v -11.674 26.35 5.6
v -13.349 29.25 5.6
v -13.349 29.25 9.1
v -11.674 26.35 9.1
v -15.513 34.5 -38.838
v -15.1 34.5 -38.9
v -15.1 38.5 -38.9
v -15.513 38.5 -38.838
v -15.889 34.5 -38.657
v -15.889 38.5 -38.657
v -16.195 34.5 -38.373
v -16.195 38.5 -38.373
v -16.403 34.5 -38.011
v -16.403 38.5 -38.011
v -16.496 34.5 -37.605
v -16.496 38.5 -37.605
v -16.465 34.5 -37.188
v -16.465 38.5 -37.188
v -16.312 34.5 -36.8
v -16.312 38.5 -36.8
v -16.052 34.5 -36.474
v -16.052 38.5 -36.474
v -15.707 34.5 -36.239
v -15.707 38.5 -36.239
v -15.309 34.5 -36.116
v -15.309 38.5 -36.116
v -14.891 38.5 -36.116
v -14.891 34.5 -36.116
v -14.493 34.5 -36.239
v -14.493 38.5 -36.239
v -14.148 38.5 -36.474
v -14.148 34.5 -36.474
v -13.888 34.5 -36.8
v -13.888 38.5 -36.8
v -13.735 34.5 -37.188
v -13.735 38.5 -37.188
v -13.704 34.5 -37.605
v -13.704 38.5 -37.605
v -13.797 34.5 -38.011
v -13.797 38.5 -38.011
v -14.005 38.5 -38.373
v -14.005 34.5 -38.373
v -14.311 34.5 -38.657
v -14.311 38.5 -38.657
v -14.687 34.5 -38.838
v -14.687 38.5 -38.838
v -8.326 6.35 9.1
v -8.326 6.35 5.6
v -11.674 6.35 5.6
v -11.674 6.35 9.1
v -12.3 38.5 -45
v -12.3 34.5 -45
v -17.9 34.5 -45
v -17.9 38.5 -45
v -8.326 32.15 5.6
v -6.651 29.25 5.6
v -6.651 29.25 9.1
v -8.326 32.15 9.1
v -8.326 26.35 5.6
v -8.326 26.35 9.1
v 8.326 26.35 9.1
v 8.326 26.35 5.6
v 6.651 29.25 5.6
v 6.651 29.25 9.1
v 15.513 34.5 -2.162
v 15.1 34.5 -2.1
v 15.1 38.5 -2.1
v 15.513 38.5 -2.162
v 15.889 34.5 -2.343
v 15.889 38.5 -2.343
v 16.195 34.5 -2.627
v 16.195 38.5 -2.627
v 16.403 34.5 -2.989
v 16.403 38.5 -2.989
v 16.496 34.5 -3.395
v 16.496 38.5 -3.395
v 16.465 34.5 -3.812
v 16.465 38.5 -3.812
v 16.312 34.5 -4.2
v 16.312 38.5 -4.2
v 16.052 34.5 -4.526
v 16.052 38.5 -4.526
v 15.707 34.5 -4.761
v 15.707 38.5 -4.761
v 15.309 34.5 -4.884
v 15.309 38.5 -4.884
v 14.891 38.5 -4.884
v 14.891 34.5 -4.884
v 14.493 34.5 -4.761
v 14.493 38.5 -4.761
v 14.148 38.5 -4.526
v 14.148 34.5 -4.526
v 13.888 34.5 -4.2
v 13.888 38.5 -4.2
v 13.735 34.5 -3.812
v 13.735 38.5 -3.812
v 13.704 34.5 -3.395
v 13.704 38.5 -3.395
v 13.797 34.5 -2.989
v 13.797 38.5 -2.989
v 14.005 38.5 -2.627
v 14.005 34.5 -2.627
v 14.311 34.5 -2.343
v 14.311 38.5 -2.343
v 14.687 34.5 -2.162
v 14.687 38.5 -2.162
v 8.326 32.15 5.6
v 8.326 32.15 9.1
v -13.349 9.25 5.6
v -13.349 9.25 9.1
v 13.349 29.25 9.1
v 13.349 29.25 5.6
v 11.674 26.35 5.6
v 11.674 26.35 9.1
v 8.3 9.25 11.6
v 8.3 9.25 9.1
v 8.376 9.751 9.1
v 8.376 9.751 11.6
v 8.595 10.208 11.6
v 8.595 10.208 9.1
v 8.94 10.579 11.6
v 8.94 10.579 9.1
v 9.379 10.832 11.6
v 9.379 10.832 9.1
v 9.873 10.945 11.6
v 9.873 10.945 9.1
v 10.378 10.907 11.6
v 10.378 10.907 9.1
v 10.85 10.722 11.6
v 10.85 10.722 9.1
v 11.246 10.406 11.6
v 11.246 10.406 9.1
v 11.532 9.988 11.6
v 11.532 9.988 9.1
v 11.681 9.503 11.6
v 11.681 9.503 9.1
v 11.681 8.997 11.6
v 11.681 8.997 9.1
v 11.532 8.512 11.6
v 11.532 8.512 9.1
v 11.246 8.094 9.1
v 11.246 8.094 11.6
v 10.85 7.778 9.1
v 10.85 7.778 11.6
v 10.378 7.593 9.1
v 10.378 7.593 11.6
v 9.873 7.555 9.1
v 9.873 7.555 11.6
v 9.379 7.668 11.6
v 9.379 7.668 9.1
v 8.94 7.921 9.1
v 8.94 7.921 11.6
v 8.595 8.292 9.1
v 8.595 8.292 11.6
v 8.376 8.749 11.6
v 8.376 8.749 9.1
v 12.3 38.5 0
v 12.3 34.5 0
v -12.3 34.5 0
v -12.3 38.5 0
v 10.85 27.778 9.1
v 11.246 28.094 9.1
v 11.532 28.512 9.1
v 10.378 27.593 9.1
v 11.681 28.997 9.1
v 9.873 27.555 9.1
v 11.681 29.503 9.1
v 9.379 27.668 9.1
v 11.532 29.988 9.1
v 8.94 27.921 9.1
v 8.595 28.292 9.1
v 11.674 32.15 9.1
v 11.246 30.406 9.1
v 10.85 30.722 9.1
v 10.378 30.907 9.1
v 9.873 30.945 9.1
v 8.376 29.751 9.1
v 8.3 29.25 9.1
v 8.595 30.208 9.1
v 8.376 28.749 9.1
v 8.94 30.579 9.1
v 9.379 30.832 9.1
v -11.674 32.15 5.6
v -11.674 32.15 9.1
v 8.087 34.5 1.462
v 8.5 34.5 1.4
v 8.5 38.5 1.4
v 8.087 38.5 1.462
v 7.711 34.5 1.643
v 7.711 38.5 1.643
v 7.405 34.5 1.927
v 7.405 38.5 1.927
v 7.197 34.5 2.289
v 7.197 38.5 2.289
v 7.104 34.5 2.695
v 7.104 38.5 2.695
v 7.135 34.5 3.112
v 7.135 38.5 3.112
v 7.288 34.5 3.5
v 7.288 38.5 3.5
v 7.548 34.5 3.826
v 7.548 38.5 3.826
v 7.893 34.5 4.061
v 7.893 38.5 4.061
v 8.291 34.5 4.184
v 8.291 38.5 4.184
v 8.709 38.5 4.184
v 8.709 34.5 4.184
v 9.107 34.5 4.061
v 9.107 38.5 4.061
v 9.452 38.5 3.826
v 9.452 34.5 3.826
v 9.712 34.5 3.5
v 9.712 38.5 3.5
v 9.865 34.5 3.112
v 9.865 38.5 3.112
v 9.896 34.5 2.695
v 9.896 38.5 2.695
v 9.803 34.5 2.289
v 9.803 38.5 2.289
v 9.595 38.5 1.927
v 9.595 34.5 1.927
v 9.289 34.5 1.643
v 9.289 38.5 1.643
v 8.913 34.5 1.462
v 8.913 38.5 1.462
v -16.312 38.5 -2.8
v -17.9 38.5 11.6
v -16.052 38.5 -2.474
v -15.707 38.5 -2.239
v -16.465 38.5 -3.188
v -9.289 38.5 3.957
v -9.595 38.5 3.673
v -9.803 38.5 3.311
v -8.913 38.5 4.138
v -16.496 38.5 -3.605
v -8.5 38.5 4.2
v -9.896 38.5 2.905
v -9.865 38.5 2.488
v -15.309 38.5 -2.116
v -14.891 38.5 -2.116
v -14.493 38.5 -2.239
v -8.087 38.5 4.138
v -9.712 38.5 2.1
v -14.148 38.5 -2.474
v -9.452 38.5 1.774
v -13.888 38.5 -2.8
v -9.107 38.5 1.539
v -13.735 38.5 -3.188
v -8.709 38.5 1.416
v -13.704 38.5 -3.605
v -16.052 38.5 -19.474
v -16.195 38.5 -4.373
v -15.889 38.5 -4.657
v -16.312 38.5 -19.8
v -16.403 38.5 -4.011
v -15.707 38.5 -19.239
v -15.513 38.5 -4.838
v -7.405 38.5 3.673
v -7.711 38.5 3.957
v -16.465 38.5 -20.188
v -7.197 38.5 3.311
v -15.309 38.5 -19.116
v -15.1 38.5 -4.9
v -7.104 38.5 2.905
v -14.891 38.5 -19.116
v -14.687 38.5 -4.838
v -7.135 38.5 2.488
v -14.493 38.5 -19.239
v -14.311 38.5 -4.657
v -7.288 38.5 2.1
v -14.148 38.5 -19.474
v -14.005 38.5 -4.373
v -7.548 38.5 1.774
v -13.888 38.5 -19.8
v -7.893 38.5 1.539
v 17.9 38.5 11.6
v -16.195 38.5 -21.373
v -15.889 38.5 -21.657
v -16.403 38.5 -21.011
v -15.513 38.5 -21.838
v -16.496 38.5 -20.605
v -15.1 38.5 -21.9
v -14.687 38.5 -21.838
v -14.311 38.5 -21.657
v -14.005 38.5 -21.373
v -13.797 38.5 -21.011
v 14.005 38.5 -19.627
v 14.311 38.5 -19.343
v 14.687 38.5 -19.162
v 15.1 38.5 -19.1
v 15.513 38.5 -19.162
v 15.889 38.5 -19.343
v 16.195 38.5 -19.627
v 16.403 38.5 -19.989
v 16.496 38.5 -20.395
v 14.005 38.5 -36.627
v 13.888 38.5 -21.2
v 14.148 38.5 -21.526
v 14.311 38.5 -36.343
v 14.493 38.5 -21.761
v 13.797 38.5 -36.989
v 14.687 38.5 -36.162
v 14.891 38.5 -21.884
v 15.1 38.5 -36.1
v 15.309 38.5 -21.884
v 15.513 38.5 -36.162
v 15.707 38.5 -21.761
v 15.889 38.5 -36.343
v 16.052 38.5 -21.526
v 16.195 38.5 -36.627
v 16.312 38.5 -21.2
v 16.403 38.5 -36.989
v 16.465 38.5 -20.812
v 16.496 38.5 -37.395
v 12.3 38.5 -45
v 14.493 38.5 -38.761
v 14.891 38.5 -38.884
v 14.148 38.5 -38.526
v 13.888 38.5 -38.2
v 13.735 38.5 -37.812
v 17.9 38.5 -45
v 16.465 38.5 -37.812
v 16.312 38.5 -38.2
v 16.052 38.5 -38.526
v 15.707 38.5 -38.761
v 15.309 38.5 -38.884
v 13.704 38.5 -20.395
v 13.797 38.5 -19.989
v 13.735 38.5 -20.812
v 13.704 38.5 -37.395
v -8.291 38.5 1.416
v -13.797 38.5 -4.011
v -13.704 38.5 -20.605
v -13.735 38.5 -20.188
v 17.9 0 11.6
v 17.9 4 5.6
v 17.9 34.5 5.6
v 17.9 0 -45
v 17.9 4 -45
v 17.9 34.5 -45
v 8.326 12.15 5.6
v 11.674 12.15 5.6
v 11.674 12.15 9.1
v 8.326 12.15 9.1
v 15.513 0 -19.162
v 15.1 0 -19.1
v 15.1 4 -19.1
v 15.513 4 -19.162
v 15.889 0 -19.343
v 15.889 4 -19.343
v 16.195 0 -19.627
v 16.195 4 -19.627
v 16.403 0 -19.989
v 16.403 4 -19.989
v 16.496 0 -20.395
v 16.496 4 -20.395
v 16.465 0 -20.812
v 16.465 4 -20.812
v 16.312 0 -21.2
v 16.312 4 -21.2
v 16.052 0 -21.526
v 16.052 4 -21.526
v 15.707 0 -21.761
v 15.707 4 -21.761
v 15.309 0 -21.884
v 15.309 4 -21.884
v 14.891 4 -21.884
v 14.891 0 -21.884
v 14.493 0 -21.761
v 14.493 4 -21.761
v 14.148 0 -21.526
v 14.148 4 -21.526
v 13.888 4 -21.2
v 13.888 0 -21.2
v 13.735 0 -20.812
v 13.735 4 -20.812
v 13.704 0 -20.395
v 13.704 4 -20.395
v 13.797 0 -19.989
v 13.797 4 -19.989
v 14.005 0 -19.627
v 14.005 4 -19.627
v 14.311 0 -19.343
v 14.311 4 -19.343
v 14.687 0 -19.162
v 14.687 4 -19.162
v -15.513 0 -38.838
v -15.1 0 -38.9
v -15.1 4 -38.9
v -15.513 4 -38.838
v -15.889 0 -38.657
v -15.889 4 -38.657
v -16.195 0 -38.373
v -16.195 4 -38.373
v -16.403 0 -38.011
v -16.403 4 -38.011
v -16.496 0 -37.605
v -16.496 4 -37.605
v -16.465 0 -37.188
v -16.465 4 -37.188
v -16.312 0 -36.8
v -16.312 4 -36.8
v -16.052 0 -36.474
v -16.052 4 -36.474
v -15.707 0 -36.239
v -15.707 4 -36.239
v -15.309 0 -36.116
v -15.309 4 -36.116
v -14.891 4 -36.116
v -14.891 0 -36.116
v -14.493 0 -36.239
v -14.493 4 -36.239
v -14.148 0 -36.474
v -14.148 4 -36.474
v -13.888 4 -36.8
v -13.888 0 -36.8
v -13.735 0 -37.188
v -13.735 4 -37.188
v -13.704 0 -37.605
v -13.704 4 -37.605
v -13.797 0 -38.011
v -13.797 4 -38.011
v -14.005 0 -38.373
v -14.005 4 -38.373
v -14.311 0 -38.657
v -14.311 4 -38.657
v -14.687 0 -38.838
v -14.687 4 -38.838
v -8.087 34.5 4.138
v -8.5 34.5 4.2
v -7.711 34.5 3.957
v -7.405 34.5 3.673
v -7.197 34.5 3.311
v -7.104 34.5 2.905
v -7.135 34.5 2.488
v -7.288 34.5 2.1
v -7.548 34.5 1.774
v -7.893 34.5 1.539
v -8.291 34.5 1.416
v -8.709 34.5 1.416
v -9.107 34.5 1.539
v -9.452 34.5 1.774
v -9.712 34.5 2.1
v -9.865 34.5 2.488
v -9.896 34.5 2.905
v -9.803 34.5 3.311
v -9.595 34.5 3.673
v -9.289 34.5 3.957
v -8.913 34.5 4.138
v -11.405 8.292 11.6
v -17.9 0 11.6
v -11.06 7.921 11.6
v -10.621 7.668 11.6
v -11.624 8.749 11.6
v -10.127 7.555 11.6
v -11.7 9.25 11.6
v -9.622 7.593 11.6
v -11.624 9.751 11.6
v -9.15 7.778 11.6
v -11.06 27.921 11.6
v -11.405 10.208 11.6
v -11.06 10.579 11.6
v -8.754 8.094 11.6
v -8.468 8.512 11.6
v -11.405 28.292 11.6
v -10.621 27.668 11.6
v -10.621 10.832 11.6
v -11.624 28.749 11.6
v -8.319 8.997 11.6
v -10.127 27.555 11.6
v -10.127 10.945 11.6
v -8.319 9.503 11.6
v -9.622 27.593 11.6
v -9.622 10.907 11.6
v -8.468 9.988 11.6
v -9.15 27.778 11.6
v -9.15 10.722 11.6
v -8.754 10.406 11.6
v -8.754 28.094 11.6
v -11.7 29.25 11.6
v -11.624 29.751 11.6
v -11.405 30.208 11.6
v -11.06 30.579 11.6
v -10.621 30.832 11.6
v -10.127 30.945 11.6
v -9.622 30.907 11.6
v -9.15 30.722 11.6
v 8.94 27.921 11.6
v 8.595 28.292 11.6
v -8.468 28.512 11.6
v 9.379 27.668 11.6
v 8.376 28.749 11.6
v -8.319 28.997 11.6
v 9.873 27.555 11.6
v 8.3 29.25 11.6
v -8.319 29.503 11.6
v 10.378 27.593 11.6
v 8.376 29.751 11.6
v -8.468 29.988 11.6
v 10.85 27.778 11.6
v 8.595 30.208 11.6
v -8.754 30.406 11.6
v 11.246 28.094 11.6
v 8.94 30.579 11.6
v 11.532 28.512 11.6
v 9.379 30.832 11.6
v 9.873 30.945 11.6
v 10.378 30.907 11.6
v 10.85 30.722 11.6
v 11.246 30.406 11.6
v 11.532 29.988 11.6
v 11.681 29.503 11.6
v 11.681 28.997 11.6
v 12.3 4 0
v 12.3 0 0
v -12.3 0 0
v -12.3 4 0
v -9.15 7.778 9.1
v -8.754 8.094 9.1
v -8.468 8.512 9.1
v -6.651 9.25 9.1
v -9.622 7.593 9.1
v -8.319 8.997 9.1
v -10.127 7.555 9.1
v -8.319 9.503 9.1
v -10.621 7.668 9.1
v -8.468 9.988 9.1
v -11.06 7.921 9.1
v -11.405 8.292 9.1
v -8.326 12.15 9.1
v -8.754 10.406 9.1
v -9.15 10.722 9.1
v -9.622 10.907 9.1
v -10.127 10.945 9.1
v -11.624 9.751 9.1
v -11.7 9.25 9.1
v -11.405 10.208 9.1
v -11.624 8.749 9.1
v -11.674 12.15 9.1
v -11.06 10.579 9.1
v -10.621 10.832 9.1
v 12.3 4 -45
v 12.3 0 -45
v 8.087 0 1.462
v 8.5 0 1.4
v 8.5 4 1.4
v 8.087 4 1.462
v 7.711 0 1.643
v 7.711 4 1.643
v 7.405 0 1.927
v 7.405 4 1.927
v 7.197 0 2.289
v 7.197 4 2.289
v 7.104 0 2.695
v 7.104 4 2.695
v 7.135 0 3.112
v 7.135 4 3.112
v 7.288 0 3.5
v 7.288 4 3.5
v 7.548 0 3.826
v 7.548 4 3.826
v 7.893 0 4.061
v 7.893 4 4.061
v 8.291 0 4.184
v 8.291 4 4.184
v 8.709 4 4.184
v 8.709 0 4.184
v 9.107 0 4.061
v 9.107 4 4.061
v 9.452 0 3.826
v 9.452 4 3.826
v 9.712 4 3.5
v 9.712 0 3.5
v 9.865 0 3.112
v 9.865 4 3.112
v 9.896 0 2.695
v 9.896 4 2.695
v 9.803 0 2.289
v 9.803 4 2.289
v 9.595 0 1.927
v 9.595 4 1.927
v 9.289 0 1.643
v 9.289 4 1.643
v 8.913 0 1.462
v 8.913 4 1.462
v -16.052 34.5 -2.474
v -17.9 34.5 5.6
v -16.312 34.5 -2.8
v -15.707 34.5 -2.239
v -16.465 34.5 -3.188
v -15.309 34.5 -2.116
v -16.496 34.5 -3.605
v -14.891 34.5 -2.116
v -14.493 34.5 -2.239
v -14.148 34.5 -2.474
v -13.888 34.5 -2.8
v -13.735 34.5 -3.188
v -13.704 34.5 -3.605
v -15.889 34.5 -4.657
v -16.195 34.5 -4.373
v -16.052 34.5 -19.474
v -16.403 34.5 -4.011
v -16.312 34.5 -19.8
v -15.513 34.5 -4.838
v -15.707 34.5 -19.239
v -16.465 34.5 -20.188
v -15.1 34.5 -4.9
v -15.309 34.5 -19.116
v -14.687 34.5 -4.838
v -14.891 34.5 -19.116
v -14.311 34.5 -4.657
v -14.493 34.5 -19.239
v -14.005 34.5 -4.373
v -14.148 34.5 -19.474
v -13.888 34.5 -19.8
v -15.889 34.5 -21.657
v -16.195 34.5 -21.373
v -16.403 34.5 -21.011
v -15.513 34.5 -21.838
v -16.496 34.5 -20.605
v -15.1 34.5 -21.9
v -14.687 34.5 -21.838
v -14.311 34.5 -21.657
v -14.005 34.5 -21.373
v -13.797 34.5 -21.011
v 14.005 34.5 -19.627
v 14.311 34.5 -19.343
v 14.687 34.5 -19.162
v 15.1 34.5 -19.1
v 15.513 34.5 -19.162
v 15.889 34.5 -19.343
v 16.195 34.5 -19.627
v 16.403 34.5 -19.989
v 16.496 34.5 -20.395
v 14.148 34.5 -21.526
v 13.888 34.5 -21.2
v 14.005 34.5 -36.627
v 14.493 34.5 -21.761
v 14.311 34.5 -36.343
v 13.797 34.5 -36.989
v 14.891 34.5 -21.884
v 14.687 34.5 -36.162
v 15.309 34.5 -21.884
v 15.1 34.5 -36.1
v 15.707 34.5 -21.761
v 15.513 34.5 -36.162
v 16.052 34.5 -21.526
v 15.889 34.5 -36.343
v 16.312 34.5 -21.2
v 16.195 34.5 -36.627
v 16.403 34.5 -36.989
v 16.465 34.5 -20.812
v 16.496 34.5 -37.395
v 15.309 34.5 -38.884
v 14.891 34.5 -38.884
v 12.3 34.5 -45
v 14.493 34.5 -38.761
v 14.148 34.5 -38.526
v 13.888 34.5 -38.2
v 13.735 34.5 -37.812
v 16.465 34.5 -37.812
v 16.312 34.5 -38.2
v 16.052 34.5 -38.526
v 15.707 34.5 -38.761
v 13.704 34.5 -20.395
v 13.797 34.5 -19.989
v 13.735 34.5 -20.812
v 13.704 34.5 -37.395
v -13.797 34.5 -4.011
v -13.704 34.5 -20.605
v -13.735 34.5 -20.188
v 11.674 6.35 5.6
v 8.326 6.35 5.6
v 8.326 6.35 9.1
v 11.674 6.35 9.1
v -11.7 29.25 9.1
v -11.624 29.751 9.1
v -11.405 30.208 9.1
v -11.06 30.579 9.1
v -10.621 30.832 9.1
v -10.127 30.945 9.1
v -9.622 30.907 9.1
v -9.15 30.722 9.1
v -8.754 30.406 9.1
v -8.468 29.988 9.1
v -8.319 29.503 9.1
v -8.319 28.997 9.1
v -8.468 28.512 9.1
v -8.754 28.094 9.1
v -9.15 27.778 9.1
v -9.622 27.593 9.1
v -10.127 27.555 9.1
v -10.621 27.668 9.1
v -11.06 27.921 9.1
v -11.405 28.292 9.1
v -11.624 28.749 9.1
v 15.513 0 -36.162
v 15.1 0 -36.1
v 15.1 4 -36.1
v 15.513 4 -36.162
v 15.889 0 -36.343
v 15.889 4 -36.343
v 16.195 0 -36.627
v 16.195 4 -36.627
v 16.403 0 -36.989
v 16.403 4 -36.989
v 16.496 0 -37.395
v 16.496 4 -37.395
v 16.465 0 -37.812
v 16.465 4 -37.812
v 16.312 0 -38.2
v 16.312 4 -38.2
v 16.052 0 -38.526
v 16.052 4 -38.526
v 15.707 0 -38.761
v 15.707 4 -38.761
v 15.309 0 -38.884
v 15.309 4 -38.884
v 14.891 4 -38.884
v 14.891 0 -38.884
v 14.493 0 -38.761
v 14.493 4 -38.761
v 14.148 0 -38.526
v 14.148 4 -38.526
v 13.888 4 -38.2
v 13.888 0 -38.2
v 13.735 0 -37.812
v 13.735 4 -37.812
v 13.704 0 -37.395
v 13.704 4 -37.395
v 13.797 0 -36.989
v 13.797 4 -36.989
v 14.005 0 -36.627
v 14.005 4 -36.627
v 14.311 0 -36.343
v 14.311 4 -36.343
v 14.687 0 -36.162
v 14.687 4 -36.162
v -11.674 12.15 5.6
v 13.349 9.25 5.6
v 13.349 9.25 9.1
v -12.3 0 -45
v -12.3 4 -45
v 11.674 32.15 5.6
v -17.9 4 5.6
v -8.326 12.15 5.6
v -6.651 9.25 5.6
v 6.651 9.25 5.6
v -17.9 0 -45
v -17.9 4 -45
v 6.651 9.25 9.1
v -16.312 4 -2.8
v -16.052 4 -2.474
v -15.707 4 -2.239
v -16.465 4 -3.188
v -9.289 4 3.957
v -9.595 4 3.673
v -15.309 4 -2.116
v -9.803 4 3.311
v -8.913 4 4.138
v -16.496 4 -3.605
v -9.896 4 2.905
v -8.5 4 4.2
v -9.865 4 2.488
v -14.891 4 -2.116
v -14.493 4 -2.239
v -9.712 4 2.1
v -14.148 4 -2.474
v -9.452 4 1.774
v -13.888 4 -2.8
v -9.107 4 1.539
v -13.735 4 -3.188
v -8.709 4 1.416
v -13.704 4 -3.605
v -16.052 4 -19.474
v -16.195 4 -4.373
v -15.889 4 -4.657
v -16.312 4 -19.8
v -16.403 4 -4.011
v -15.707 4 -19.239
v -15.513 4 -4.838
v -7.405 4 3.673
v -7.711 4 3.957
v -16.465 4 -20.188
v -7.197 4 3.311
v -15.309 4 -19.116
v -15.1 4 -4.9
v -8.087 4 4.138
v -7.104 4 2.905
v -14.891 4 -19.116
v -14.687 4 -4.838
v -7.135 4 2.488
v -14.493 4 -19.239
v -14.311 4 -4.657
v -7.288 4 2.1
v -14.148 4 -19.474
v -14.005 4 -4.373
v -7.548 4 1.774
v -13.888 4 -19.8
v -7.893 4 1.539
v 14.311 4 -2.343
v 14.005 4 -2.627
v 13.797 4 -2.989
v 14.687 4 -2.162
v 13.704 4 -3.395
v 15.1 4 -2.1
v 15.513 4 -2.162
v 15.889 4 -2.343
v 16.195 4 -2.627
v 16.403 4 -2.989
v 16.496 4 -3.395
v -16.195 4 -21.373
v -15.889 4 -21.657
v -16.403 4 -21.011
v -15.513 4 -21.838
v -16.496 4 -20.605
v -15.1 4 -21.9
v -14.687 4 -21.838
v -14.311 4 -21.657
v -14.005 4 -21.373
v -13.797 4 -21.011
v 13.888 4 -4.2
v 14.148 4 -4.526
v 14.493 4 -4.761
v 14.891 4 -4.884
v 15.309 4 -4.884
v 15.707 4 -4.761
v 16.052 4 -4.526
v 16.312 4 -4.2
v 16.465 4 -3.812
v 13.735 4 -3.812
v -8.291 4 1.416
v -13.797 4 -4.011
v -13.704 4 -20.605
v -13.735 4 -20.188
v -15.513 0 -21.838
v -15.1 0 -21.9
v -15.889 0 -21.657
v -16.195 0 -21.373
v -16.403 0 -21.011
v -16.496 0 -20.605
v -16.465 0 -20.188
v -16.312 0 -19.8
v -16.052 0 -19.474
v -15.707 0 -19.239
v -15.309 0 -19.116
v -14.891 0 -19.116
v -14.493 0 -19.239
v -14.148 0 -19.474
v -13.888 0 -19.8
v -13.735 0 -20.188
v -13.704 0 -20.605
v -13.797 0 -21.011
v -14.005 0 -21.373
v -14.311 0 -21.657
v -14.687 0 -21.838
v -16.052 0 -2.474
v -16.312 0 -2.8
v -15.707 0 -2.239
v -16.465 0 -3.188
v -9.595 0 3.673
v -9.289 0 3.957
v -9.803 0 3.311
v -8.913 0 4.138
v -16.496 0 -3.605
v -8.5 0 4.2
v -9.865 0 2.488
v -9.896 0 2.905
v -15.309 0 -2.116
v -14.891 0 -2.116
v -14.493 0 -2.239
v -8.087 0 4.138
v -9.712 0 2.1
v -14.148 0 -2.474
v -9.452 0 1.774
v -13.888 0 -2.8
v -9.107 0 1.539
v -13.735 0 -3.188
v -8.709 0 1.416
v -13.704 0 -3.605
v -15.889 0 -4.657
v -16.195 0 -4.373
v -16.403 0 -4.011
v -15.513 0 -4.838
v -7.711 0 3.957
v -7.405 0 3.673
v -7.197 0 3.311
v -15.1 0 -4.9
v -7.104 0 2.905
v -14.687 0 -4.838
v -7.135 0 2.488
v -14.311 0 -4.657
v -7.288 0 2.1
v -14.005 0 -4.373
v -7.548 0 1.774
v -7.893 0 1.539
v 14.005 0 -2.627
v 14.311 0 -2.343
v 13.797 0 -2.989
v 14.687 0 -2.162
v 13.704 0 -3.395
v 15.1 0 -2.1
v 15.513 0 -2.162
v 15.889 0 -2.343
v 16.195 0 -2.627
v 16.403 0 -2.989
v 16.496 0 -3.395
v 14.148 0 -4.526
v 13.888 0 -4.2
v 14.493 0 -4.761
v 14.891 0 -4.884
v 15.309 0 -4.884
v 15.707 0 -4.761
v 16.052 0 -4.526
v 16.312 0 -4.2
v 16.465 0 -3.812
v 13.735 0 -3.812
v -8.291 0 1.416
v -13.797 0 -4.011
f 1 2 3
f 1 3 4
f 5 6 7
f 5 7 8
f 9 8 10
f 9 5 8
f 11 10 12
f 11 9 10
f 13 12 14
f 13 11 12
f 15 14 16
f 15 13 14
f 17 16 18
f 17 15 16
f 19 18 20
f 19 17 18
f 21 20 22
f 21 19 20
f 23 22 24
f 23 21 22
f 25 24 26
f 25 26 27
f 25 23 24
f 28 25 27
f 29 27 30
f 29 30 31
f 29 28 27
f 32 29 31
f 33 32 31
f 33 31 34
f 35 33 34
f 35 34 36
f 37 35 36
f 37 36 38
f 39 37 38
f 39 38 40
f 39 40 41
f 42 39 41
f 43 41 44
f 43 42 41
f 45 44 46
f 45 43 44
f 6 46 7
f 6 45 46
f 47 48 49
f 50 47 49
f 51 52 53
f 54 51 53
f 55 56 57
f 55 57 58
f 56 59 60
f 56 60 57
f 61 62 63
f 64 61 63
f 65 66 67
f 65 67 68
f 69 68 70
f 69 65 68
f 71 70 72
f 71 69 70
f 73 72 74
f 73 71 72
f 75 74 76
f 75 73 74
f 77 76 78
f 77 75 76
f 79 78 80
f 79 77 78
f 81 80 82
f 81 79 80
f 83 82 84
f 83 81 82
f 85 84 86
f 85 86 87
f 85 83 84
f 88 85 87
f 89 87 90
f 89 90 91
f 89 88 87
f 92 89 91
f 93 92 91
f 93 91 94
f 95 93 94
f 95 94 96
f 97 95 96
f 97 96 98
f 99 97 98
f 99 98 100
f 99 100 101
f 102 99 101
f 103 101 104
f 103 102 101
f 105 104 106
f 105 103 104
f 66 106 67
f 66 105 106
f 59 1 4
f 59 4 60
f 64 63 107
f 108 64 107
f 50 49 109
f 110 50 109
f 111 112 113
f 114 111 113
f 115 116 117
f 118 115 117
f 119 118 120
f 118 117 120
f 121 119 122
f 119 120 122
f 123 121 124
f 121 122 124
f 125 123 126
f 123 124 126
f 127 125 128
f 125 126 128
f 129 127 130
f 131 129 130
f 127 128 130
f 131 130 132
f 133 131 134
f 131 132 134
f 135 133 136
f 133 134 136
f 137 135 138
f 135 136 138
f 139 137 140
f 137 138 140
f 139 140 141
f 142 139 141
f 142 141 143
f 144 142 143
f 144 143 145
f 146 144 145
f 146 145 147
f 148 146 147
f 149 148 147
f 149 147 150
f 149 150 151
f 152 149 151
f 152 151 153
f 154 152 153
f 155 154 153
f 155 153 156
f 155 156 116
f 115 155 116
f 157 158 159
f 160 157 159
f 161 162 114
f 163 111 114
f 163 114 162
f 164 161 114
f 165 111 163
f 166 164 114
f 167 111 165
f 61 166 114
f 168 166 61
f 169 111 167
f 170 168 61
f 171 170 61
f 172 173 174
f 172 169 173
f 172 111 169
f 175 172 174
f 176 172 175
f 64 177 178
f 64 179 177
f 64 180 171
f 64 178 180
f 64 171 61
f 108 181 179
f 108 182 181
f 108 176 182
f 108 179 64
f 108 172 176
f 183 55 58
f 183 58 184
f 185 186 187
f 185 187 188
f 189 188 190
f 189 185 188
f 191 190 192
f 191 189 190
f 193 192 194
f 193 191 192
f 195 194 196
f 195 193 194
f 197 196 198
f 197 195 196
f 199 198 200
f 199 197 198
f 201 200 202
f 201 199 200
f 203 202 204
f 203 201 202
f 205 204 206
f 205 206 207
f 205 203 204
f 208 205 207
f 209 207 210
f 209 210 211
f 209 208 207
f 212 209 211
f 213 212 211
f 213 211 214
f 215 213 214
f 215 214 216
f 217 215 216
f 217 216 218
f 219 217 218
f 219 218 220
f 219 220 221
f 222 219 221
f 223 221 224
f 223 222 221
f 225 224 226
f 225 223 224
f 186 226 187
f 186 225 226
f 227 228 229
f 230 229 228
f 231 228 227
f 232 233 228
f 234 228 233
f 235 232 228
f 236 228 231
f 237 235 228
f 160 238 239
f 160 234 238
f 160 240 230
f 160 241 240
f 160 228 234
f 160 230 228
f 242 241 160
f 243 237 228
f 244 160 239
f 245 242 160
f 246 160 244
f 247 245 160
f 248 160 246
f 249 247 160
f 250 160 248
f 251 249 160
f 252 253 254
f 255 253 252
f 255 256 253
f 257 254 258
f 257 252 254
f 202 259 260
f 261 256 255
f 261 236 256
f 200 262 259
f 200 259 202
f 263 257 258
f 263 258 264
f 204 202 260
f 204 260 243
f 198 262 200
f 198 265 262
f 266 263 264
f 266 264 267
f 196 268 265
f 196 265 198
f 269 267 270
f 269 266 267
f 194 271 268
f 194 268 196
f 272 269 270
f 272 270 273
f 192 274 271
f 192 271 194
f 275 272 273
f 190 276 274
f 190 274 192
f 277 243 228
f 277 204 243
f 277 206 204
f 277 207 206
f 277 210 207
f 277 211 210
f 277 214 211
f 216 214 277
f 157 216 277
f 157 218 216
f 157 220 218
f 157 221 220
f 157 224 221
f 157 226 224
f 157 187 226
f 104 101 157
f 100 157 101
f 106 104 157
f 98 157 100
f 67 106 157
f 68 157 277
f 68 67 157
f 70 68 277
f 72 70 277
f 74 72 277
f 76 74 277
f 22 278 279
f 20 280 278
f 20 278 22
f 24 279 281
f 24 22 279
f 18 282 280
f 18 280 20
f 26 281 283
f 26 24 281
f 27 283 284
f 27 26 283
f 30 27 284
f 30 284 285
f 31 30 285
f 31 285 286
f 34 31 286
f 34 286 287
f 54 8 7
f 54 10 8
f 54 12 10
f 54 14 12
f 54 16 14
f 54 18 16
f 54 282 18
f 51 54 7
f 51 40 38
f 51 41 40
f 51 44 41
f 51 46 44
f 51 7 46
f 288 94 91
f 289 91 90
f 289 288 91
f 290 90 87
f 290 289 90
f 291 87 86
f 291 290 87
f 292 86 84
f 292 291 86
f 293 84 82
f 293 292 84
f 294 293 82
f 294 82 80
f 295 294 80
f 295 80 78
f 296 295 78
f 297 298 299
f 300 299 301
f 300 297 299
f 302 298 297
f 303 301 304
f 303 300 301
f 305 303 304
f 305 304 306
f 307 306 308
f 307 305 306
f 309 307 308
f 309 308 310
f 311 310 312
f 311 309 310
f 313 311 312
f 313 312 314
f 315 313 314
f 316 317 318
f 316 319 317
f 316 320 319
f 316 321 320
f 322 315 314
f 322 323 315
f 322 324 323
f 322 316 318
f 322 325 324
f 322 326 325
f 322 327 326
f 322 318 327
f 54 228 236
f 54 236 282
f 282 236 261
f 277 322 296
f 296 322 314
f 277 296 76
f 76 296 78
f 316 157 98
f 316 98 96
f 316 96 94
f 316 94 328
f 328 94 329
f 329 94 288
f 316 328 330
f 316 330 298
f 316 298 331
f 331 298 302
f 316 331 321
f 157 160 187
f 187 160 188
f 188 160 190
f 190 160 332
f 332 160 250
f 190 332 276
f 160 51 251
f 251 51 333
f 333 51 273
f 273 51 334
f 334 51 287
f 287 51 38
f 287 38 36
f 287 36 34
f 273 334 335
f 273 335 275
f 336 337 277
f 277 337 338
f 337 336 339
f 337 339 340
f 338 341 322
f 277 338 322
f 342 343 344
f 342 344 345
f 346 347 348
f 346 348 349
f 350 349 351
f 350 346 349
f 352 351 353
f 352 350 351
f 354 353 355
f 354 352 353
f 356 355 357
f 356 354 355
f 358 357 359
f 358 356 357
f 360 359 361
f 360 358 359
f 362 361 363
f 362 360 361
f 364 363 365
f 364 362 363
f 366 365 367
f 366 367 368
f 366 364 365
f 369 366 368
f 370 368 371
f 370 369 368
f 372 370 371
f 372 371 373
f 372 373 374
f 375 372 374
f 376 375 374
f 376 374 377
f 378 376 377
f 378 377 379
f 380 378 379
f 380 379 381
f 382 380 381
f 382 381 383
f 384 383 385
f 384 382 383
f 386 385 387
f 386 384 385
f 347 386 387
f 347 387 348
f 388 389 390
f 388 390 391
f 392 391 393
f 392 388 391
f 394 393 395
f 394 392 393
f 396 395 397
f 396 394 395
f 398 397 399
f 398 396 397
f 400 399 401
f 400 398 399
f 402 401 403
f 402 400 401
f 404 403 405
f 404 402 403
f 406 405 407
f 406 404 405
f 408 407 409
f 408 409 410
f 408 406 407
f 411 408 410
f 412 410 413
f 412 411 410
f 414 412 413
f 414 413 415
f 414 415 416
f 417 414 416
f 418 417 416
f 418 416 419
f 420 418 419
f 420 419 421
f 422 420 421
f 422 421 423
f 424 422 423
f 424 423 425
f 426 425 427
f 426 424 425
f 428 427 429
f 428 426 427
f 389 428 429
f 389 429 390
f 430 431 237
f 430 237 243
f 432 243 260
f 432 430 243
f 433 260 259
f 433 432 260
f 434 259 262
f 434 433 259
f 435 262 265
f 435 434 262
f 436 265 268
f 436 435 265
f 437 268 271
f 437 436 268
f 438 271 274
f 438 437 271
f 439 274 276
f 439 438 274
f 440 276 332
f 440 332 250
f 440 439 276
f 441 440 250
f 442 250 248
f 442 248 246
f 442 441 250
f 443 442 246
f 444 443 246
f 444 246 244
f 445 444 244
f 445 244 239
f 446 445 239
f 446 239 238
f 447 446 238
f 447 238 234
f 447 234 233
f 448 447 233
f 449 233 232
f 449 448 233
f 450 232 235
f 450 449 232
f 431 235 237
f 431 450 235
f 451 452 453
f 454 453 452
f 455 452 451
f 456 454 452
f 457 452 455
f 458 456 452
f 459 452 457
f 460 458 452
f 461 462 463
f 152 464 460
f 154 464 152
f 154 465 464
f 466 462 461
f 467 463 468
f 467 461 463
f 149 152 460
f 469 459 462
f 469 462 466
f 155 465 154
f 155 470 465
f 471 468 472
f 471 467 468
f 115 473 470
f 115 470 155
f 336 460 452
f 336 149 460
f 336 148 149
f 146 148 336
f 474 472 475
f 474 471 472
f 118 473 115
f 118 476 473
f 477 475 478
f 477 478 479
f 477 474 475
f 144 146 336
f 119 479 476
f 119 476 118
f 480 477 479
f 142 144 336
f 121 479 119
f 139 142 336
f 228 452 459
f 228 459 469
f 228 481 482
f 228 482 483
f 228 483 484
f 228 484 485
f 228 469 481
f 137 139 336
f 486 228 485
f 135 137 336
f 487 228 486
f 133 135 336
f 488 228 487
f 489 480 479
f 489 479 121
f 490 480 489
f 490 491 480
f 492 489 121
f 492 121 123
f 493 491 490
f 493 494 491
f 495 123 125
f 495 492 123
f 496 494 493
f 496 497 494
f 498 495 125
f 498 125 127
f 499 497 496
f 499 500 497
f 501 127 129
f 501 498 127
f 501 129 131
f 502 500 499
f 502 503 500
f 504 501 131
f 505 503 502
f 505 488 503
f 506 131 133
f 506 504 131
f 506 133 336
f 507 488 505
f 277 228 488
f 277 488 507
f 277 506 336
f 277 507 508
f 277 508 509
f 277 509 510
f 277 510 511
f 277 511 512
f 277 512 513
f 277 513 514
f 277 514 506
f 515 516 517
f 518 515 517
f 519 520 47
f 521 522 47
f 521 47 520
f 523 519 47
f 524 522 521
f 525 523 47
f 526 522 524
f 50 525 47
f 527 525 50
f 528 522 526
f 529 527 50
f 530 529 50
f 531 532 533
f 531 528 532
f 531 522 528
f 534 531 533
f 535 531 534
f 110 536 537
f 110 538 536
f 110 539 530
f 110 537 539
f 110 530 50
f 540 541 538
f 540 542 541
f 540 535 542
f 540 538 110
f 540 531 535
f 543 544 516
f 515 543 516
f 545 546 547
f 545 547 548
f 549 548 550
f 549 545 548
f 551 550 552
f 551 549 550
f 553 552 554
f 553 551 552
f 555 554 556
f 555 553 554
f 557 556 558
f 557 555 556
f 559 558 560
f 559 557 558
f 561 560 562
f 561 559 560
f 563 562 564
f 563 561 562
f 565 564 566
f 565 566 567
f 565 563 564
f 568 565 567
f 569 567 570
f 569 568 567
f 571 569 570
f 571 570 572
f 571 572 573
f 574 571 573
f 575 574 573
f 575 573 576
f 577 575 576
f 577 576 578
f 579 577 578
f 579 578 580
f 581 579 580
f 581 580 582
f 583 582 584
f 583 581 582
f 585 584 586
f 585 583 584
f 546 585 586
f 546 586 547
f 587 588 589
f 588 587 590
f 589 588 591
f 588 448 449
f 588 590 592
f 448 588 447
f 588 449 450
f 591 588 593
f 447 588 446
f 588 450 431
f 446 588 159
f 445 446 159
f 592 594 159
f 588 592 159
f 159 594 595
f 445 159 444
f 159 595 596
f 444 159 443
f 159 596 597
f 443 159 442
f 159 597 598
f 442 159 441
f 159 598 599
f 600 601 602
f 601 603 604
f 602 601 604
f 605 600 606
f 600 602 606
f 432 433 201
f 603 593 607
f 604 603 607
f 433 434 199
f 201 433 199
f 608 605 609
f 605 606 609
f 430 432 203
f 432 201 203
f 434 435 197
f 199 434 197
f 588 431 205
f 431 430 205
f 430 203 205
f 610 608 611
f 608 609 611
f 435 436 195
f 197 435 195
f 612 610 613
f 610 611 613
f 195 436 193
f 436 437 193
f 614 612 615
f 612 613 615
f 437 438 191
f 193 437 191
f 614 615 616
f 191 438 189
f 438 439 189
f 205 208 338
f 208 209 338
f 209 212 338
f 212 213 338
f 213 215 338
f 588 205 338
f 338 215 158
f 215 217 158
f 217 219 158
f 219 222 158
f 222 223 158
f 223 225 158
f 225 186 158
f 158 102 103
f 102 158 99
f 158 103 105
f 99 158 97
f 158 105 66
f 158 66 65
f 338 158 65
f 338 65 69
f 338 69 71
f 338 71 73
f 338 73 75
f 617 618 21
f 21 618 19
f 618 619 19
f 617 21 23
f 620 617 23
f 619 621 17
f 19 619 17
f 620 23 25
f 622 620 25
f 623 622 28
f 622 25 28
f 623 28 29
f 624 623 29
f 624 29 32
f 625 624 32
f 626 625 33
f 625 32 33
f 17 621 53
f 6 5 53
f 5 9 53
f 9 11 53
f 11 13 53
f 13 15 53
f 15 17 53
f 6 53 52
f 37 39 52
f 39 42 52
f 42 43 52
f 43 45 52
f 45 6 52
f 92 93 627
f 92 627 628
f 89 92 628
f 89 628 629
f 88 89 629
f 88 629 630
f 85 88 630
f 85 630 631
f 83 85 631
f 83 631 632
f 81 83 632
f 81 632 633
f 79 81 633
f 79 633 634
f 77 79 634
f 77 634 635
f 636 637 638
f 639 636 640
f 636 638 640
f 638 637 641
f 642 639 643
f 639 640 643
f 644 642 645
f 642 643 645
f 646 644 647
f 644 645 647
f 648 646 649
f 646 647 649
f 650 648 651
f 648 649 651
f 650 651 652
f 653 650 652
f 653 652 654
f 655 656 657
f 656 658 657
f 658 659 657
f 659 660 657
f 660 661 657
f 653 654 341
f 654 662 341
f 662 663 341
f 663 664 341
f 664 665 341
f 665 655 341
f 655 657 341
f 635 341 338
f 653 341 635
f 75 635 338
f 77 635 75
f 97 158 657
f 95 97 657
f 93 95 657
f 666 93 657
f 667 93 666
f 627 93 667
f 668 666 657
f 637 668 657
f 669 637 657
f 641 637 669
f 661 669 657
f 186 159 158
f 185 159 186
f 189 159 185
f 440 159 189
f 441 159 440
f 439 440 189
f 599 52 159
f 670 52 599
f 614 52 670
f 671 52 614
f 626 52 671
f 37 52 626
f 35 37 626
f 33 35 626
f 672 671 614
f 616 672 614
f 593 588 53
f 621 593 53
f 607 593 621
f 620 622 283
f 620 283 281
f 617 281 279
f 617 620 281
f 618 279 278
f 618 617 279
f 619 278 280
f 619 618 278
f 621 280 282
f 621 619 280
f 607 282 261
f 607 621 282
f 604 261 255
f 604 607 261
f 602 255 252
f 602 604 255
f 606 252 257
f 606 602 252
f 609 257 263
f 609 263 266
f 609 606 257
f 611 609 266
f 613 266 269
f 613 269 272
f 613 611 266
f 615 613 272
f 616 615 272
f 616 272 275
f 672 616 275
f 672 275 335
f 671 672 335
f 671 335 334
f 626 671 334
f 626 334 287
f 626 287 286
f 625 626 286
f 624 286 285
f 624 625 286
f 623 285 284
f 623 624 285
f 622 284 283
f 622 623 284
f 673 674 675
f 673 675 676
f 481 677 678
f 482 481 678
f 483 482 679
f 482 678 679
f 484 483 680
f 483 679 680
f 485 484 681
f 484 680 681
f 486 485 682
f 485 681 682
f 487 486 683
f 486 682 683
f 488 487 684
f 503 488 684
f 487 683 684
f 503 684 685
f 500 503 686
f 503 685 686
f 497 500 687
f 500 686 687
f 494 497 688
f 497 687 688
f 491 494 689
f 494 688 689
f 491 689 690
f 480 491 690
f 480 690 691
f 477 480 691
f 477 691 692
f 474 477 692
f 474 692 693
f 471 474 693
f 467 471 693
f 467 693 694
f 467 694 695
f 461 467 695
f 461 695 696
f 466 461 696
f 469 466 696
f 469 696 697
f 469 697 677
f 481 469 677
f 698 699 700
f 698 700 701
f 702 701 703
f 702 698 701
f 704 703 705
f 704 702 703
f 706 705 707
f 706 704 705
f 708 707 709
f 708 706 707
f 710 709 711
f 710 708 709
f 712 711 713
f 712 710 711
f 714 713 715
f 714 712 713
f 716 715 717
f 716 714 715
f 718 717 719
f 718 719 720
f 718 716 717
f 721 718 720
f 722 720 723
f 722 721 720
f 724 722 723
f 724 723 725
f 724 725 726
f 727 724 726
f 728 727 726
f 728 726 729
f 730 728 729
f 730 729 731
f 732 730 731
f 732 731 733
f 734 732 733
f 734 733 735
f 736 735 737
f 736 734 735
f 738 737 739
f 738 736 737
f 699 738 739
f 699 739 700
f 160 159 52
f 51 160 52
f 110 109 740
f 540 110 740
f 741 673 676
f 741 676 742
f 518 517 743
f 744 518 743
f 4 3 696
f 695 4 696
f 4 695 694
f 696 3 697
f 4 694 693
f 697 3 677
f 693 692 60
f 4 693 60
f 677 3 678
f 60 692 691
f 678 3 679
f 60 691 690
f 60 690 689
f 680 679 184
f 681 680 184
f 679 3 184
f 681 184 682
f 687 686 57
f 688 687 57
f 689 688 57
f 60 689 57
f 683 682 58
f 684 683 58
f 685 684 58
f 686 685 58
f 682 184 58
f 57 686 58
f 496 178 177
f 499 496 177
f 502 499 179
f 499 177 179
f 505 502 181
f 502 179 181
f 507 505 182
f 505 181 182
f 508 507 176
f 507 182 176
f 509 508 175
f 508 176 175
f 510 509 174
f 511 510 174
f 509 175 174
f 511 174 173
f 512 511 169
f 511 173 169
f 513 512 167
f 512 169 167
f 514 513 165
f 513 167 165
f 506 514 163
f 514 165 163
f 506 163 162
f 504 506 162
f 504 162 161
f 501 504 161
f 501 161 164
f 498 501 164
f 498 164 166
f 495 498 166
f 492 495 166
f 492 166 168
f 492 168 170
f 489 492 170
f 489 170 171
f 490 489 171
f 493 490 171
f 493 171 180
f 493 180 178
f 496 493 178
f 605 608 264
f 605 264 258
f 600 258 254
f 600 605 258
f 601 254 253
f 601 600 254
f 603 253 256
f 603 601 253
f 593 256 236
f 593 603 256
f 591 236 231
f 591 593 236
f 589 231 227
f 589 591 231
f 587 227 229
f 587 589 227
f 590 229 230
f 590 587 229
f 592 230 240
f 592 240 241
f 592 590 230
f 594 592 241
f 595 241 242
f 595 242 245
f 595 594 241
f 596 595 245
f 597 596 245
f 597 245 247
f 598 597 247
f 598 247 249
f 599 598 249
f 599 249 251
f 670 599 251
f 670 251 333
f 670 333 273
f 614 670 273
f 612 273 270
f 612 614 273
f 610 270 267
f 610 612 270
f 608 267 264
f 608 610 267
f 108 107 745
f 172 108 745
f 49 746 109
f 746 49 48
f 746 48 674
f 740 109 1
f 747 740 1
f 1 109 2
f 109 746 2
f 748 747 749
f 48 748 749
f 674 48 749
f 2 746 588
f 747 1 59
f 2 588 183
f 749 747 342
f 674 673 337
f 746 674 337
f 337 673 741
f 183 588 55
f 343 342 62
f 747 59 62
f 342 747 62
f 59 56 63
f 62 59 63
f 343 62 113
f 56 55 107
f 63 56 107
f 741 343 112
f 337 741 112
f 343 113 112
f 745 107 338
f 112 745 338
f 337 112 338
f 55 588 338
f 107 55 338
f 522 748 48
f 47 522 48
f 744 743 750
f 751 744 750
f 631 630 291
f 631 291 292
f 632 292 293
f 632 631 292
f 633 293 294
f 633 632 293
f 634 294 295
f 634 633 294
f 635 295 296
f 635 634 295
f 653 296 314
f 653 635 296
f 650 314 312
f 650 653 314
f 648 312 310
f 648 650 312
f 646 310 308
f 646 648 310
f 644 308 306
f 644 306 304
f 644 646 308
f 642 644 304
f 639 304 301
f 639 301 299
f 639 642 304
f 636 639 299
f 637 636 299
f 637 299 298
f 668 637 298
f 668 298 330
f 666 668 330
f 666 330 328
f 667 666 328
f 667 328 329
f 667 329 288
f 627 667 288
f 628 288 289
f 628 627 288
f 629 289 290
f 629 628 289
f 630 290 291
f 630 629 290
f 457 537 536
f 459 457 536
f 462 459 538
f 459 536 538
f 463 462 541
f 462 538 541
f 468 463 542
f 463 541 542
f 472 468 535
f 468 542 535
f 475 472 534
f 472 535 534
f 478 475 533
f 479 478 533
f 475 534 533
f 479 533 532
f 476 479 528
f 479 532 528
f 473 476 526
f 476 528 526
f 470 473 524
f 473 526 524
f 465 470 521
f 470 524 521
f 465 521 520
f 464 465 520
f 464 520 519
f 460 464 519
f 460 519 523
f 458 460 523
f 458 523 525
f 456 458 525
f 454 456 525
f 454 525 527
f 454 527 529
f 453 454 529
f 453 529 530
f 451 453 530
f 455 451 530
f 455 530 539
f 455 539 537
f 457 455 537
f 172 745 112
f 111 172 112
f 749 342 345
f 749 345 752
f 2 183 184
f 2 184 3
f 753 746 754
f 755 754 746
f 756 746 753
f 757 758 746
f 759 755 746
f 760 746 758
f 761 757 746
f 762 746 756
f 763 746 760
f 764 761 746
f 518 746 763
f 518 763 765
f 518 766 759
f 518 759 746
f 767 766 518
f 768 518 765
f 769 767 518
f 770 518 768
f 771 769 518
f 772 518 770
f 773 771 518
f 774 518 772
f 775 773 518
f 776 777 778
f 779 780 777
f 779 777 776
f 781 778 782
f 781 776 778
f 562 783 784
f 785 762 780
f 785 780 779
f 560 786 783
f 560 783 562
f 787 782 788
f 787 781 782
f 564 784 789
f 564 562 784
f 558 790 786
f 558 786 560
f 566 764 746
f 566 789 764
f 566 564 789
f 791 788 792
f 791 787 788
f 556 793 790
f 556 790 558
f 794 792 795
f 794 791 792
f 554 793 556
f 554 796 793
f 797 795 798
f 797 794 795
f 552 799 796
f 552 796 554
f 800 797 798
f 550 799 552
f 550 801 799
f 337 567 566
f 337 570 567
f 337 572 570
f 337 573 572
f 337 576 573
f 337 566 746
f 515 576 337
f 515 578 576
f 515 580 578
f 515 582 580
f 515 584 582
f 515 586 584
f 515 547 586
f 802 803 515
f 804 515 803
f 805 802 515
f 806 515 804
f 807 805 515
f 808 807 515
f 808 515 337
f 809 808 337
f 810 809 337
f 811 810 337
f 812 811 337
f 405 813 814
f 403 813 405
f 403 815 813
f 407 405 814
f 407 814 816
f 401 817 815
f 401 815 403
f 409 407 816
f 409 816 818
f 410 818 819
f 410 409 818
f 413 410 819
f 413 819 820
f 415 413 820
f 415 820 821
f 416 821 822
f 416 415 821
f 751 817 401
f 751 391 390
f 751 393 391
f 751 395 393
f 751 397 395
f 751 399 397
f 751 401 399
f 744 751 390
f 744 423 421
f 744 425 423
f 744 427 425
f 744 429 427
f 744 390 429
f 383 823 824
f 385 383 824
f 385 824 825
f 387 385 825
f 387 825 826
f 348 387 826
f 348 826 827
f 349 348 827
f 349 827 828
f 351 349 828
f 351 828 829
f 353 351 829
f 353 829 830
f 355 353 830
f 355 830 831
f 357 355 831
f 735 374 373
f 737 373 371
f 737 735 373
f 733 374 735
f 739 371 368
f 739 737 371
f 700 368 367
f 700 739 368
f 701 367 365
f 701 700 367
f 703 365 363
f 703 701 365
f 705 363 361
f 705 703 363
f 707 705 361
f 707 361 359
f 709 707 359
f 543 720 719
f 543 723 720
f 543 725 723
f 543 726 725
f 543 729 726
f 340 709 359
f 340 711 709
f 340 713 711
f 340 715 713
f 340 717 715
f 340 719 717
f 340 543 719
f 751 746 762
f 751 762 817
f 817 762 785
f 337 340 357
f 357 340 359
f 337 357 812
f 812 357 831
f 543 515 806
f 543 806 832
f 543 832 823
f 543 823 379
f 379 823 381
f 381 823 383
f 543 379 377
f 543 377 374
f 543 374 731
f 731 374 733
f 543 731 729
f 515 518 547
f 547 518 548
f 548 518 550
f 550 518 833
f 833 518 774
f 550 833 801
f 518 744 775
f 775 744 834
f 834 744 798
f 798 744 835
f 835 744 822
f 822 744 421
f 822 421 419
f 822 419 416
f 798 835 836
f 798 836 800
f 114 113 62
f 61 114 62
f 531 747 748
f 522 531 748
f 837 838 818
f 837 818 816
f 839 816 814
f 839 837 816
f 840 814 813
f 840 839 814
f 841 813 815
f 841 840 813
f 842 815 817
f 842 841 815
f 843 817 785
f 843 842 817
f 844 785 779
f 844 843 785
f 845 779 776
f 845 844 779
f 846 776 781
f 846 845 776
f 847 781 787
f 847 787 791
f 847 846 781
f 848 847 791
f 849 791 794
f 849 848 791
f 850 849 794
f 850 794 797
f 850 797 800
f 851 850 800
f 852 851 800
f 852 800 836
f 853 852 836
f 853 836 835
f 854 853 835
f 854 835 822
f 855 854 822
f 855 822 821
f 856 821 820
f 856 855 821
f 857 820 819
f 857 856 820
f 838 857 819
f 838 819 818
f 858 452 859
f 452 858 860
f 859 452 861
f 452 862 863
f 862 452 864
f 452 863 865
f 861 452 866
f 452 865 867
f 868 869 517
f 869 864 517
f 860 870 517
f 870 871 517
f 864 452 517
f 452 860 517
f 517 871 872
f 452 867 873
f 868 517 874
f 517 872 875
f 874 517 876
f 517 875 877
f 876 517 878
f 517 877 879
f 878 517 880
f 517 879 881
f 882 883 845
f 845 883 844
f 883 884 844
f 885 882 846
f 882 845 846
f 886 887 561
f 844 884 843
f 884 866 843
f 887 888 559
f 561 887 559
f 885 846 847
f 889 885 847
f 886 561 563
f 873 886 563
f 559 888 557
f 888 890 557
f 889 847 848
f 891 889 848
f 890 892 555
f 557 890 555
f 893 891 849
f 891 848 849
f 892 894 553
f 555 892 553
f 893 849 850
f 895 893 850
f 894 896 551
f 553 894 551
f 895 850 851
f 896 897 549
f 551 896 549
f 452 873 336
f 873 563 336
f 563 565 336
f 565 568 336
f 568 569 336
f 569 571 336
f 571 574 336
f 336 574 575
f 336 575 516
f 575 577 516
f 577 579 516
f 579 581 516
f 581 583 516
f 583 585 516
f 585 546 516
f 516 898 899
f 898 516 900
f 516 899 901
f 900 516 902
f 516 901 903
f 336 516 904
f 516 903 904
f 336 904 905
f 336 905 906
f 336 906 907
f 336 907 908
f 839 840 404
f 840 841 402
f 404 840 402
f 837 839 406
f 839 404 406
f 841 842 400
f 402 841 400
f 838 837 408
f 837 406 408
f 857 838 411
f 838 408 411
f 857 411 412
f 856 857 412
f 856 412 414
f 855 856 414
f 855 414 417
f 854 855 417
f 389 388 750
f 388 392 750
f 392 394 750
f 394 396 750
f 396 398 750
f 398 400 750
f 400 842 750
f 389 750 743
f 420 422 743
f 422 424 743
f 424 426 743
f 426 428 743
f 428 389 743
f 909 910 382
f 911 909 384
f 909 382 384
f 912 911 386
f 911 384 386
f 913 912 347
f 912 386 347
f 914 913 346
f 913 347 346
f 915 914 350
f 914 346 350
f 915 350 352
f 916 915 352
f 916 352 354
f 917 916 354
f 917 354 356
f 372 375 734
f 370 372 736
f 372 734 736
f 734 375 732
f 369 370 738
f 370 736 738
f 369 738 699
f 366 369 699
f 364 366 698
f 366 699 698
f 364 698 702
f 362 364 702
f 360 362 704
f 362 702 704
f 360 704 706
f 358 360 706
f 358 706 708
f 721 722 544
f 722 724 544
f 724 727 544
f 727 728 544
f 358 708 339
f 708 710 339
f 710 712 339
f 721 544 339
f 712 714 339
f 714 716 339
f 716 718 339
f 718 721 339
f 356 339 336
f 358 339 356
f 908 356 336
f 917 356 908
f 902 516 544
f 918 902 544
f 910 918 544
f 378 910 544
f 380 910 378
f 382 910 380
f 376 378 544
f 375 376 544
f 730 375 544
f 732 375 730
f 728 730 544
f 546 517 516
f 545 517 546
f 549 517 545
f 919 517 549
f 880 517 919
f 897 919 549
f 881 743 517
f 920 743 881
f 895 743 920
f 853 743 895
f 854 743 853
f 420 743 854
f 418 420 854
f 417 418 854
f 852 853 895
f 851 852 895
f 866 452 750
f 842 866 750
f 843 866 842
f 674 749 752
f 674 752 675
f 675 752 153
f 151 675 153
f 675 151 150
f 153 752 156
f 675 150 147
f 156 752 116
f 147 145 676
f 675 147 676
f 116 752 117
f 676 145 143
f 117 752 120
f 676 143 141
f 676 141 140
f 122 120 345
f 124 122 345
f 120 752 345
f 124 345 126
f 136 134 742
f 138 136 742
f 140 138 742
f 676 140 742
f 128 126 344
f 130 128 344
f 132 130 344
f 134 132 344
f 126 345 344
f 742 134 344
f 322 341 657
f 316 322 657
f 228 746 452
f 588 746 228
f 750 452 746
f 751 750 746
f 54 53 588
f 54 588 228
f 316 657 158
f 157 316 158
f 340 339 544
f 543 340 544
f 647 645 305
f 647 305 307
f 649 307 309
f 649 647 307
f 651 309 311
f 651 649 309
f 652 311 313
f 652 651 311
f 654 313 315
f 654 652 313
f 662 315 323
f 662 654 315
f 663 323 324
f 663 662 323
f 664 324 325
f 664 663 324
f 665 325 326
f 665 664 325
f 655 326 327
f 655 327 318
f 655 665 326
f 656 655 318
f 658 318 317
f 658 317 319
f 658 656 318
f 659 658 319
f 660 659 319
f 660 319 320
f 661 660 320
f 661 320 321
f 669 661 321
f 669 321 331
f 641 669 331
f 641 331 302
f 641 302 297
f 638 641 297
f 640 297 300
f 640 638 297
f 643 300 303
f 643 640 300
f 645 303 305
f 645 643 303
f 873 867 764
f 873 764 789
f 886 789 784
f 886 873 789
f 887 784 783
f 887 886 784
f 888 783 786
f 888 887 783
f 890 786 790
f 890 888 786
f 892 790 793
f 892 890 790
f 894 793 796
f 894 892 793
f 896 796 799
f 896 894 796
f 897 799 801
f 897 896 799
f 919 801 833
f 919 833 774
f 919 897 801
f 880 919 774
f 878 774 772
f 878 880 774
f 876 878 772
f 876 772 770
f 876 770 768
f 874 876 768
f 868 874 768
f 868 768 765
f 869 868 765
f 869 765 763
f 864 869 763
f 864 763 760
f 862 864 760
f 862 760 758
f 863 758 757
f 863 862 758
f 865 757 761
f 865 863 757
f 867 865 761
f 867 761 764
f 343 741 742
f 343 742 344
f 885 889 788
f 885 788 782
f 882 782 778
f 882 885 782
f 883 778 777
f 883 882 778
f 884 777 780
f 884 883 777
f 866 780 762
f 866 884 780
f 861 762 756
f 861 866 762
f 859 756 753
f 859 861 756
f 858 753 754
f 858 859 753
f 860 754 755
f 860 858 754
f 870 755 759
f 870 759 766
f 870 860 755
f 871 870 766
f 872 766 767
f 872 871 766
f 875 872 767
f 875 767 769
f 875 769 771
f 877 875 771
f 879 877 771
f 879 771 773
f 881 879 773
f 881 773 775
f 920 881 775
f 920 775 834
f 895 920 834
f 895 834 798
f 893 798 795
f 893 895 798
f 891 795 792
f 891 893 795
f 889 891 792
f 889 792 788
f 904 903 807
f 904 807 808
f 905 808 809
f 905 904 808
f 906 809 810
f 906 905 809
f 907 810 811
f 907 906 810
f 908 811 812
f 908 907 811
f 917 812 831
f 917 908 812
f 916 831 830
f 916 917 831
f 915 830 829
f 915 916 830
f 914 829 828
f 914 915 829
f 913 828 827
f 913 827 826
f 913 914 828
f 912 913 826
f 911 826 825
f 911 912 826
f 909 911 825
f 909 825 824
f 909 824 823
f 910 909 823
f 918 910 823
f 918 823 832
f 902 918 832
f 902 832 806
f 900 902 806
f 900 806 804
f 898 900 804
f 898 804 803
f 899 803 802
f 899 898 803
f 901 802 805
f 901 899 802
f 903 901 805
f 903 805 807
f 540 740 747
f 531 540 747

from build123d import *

# Parameters (mm, degrees)
SKETCH1_R           = 1.4
BOSS_EXTRUDE1_DEPTH = 4
SKETCH2_R           = 1.4
BOSS_EXTRUDE2_DEPTH = 4
SKETCH3_W           = 35.8
SKETCH3_H           = 38.5
BOSS_EXTRUDE3_DEPTH = 6
CUT_EXTRUDE1_DEPTH  = 3.5
SKETCH5_R           = 1.7
CUT_EXTRUDE3_DEPTH  = 67.053160409


with BuildPart() as part:
    # Sketch1 → Boss-Extrude1 (new body)
    with BuildSketch(Plane(origin=(0, 0, 0), x_dir=(1, 0, 0), z_dir=(0, 1, 0))):
        Polygon((-17.9, 45), (-17.9, -5.6), (17.9, -5.6), (17.9, 45), (12.3, 45), (12.3, 0), (-12.3, 0), (-12.3, 45), align=None)
        with Locations(Location((-8.5, -2.8, 0), (0, 0, 270))):
            Circle(SKETCH1_R, mode=Mode.SUBTRACT)
        with Locations(Location((8.5, -2.8, 0), (0, 0, 90))):
            Circle(SKETCH1_R, mode=Mode.SUBTRACT)
        with Locations(Location((15.1, 37.5, 0), (0, 0, 270))):
            Circle(SKETCH1_R, mode=Mode.SUBTRACT)
        with Locations(Location((15.1, 20.5, 0), (0, 0, 270))):
            Circle(SKETCH1_R, mode=Mode.SUBTRACT)
        with Locations(Location((15.1, 3.5, 0), (0, 0, 270))):
            Circle(SKETCH1_R, mode=Mode.SUBTRACT)
        with Locations(Location((-15.1, 3.5, 0), (0, 0, 90))):
            Circle(SKETCH1_R, mode=Mode.SUBTRACT)
        with Locations(Location((-15.1, 20.5, 0), (0, 0, 90))):
            Circle(SKETCH1_R, mode=Mode.SUBTRACT)
        with Locations(Location((-15.1, 37.5, 0), (0, 0, 90))):
            Circle(SKETCH1_R, mode=Mode.SUBTRACT)
    extrude(amount=BOSS_EXTRUDE1_DEPTH)



with BuildPart() as body_2:
    # Sketch2 → Boss-Extrude2 (new body)
    with BuildSketch(Plane(origin=(0, 34.5, 0), x_dir=(1, 0, 0), z_dir=(0, 1, 0))):
        Polygon((-17.9, -5.6), (17.9, -5.6), (17.9, 45), (12.3, 45), (12.3, 0), (-12.3, 0), (-12.3, 45), (-17.9, 45), align=None)
        with Locations(Location((8.5, -2.8, 0), (0, 0, 90))):
            Circle(SKETCH2_R, mode=Mode.SUBTRACT)
        with Locations(Location((-8.5, -2.8, 0), (0, 0, 270))):
            Circle(SKETCH2_R, mode=Mode.SUBTRACT)
        with Locations(Location((-15.1, 3.5, 0), (0, 0, 90))):
            Circle(SKETCH2_R, mode=Mode.SUBTRACT)
        with Locations(Location((-15.1, 20.5, 0), (0, 0, 90))):
            Circle(SKETCH2_R, mode=Mode.SUBTRACT)
        with Locations(Location((15.1, 3.5, 0), (0, 0, 270))):
            Circle(SKETCH2_R, mode=Mode.SUBTRACT)
        with Locations(Location((15.1, 20.5, 0), (0, 0, 270))):
            Circle(SKETCH2_R, mode=Mode.SUBTRACT)
        with Locations(Location((15.1, 37.5, 0), (0, 0, 270))):
            Circle(SKETCH2_R, mode=Mode.SUBTRACT)
        with Locations(Location((-15.1, 37.5, 0), (0, 0, 90))):
            Circle(SKETCH2_R, mode=Mode.SUBTRACT)
    extrude(amount=BOSS_EXTRUDE2_DEPTH)


with BuildPart() as part_1:
    add(part.part)

    add(body_2.part)  # Boss-Extrude3 merges body 2
    # Sketch3 → Boss-Extrude3 (add)
    with BuildSketch(Plane.XY.offset(5.6)):
        with Locations((0, 19.25)):
            Rectangle(SKETCH3_W, SKETCH3_H)
    extrude(amount=BOSS_EXTRUDE3_DEPTH)

    # Sketch4 → Cut-Extrude1 (cut)
    with BuildSketch(Plane(origin=(0, 0, 5.6), x_dir=(-1, 0, 0), z_dir=(0, 0, -1))):
        Polygon((8.325684219, 26.35), (6.651368439, 29.25), (8.325684219, 32.15), (11.674315781, 32.15), (13.348631561, 29.25), (11.674315781, 26.35), align=None)
        Polygon((-8.325684219, 26.35), (-6.651368439, 29.25), (-8.325684219, 32.15), (-11.674315781, 32.15), (-13.348631561, 29.25), (-11.674315781, 26.35), align=None)
        Polygon((6.651368439, 9.25), (8.325684219, 6.35), (11.674315781, 6.35), (13.348631561, 9.25), (11.674315781, 12.15), (8.325684219, 12.15), align=None)
        Polygon((-6.651368439, 9.25), (-8.325684219, 6.35), (-11.674315781, 6.35), (-13.348631561, 9.25), (-11.674315781, 12.15), (-8.325684219, 12.15), align=None)
    extrude(amount=-CUT_EXTRUDE1_DEPTH, mode=Mode.SUBTRACT)

    # Sketch5 → Cut-Extrude3 (cut, through all)
    with BuildSketch(Plane(origin=(0, 0, 5.6), x_dir=(-1, 0, 0), z_dir=(0, 0, -1))):
        with Locations((-10, 29.25)):
            Circle(SKETCH5_R)
        with Locations((-10, 9.25)):
            Circle(SKETCH5_R)
        with Locations((10, 9.25)):
            Circle(SKETCH5_R)
        with Locations((10, 29.25)):
            Circle(SKETCH5_R)
    extrude(amount=-CUT_EXTRUDE3_DEPTH, mode=Mode.SUBTRACT)


solid = part_1.part
